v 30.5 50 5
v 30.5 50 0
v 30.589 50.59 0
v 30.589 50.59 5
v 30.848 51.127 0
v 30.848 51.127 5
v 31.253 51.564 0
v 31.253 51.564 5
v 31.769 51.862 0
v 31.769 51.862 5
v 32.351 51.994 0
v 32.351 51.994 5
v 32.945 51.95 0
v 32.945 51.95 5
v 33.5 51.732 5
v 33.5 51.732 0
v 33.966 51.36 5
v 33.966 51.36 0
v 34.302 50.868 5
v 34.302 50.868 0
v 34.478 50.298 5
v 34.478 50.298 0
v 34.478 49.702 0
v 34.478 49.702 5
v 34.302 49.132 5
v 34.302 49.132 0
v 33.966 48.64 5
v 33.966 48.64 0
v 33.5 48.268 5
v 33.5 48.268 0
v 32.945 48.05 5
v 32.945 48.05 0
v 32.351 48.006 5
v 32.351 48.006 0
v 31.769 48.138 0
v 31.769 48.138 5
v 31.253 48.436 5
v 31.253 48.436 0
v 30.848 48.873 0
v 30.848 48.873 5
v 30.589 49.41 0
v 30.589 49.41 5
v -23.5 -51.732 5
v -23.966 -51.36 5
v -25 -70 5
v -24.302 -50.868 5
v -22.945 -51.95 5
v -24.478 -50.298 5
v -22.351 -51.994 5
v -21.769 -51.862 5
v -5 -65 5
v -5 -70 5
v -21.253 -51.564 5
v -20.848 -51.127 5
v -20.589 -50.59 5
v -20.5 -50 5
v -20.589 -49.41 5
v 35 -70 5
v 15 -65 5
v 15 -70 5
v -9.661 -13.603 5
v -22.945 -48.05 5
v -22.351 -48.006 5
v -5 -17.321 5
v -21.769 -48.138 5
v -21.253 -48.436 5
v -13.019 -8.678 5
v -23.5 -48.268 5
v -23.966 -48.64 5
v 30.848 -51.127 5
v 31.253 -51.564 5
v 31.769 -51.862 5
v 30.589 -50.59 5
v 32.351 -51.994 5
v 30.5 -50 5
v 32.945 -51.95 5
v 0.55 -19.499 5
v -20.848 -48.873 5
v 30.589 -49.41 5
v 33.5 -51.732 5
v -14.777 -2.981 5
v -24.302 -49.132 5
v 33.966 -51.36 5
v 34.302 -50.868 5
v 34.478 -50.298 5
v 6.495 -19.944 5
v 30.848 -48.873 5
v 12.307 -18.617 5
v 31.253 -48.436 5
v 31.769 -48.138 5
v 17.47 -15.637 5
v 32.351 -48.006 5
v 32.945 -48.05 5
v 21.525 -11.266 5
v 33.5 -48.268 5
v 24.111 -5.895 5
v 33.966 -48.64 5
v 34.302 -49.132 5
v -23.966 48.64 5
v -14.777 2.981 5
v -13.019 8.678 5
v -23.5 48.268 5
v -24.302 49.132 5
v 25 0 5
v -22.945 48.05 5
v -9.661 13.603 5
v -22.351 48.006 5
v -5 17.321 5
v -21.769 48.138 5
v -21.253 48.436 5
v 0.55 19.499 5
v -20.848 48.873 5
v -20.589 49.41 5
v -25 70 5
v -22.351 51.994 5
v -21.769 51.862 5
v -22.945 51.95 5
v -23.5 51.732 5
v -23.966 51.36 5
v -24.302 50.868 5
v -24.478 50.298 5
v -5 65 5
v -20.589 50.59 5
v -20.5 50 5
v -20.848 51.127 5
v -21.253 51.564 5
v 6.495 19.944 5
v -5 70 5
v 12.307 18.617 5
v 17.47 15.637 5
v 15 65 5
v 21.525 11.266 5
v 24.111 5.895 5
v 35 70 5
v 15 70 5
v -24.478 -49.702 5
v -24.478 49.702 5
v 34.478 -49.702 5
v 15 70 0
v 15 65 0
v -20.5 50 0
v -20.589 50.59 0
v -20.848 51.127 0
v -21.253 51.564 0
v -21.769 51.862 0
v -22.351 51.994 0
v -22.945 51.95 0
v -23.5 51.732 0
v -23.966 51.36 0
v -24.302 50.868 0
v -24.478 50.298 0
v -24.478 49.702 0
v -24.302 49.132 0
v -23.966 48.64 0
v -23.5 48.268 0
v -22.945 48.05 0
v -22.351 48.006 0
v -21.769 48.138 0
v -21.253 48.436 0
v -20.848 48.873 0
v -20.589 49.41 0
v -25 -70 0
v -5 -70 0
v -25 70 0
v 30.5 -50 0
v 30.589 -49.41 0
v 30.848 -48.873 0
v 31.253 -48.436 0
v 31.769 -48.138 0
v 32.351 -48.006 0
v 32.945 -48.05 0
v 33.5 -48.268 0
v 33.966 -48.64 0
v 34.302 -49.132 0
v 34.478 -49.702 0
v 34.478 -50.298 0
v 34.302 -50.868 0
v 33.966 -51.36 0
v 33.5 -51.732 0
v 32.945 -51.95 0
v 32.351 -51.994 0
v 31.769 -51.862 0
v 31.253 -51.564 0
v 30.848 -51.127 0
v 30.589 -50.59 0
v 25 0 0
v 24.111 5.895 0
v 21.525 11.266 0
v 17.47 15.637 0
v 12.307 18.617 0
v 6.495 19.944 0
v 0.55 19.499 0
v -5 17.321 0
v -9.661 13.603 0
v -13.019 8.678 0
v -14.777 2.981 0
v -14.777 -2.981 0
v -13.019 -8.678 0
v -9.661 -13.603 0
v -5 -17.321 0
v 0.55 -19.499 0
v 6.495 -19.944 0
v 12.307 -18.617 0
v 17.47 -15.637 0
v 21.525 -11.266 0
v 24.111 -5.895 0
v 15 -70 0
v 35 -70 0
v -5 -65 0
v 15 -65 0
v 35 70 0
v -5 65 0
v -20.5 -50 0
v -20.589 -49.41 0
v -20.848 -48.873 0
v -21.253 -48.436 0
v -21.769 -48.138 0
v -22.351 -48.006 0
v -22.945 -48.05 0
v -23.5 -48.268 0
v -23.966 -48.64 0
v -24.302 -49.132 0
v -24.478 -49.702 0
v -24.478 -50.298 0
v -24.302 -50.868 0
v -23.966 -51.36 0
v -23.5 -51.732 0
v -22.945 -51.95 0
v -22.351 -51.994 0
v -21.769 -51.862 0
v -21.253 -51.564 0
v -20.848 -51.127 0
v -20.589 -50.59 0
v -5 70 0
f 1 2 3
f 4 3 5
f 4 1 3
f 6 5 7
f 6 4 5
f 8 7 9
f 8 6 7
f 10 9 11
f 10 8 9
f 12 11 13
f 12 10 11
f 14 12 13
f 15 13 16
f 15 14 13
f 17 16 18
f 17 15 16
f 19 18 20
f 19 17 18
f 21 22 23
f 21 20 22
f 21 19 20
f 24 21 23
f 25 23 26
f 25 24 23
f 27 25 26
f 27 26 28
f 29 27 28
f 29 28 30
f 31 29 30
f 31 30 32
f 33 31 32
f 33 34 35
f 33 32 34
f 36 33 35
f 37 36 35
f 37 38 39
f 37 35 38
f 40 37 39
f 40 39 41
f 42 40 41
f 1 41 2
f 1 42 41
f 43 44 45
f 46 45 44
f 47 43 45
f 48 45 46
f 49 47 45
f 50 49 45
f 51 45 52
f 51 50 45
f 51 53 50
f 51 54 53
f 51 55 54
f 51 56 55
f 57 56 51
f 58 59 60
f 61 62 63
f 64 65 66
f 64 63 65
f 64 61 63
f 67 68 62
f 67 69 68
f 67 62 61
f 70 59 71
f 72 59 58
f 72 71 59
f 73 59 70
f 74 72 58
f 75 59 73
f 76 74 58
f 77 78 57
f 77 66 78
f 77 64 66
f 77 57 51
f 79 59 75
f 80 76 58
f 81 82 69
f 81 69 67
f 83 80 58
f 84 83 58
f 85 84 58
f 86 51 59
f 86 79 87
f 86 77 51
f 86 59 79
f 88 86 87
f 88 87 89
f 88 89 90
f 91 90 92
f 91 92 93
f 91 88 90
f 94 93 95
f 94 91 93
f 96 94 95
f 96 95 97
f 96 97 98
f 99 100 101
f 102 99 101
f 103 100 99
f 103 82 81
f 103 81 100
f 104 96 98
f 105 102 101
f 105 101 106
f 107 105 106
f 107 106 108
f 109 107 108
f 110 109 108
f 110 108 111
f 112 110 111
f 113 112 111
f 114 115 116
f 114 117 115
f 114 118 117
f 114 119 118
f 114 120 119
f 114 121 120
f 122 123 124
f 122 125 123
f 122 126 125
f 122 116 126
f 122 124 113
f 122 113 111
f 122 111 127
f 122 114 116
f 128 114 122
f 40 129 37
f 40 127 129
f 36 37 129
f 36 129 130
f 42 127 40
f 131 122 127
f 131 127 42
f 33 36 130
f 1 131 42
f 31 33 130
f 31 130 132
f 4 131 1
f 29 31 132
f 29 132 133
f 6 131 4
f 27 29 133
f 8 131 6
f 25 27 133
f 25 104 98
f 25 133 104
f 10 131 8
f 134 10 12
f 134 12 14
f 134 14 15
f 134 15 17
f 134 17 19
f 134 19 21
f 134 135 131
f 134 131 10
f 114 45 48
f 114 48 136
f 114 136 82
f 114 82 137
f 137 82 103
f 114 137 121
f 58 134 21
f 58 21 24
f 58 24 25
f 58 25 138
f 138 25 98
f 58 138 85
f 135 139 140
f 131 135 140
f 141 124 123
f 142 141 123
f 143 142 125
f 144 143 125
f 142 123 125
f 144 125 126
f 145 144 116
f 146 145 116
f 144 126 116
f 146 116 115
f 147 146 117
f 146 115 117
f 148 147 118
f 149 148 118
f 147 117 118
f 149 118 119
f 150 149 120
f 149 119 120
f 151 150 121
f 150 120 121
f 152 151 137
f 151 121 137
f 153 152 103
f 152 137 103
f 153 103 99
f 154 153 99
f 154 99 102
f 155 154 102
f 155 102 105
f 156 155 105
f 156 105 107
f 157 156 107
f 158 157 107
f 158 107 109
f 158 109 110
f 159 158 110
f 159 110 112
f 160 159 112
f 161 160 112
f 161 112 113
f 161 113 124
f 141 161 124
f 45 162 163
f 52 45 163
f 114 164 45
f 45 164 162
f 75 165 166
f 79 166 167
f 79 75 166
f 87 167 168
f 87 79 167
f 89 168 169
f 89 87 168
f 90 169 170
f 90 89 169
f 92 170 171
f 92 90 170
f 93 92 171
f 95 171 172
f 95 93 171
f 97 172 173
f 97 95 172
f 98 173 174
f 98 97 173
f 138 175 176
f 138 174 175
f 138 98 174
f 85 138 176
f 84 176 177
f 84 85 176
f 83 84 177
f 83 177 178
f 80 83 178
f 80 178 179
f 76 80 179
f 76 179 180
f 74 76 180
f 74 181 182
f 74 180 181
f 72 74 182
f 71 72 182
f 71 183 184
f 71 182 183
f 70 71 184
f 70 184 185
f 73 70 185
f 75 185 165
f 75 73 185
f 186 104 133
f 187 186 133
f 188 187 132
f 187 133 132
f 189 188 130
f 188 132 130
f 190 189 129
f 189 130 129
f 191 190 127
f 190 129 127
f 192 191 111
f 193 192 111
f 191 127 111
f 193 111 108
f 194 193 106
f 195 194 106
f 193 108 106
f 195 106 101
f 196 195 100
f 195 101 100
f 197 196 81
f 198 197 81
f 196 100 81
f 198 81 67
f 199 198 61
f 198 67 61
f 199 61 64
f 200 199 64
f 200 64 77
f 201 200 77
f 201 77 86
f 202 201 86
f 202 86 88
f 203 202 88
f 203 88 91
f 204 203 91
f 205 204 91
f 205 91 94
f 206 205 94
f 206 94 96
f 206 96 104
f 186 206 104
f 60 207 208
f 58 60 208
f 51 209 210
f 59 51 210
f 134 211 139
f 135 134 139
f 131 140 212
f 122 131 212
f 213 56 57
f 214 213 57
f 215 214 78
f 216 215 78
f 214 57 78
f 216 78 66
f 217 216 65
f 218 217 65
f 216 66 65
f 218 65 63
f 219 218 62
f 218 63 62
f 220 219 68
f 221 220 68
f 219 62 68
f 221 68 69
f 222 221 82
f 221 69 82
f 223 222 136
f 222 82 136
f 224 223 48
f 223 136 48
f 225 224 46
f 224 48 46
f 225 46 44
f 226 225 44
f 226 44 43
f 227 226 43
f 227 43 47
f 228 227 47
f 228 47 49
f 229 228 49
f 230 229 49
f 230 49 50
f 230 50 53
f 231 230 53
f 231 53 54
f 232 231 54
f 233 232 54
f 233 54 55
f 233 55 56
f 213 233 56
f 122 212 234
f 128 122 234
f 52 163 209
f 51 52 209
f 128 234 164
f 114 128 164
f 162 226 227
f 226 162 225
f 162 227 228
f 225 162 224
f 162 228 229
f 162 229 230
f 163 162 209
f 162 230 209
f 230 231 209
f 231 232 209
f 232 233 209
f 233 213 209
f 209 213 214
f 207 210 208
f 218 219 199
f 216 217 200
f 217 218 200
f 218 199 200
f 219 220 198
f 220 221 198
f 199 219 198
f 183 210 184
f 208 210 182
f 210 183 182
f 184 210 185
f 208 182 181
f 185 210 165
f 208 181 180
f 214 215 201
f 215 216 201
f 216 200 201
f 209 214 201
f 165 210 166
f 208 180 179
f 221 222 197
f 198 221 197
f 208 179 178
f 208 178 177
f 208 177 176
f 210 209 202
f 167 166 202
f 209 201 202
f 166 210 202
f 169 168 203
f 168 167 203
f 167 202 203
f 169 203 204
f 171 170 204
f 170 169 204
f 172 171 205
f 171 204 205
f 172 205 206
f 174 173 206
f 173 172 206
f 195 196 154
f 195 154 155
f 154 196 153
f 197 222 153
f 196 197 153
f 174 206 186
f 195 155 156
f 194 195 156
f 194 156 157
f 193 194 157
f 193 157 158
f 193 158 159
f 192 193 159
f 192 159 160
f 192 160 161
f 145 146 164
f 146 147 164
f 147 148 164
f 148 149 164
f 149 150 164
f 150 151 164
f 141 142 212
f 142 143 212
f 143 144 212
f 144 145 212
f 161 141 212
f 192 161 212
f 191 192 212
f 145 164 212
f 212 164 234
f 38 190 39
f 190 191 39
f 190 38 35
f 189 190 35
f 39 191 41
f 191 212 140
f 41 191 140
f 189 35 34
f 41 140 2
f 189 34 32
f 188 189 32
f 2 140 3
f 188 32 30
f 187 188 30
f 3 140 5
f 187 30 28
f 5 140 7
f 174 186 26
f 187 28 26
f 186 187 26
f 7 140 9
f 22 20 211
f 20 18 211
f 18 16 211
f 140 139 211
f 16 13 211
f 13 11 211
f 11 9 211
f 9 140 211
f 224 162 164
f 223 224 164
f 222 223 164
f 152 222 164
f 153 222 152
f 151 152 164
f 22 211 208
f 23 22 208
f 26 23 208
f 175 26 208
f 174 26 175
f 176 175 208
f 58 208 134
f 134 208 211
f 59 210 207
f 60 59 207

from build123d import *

# Parameters (mm, degrees)
BOSS_EXTRUDE1_DEPTH = 5
SKETCH3_R           = 2
CUT_EXTRUDE1_DEPTH  = 10
SKETCH4_R           = 20
CUT_EXTRUDE2_DEPTH  = 300


with BuildPart() as part:
    # Sketch2 → Boss-Extrude1 (new body)
    with BuildSketch(Plane.XY):
        Polygon((-5, 70), (-25, 70), (-25, -70), (-5, -70), (-5, -65), (15, -65), (15, -70), (35, -70), (35, 70), (15, 70), (15, 65), (-5, 65), align=None)
    extrude(amount=BOSS_EXTRUDE1_DEPTH)

    # Sketch3 → Cut-Extrude1 (cut)
    with BuildSketch(Plane.XY.offset(5)):
        with Locations((-22.5, 50)):
            Circle(SKETCH3_R)
        with Locations((-22.5, -50)):
            Circle(SKETCH3_R)
    cut_extrude1 = extrude(amount=-CUT_EXTRUDE1_DEPTH, mode=Mode.SUBTRACT)

    # Mirror1: Cut-Extrude1 across plane
    add(cut_extrude1.mirror(Plane.ZY.offset(-5)), mode=Mode.SUBTRACT)

    # Sketch4 → Cut-Extrude2 (cut)
    with BuildSketch(Plane.XY.offset(5)):
        with Locations((5, 0)):
            Circle(SKETCH4_R)
    extrude(amount=-CUT_EXTRUDE2_DEPTH, mode=Mode.SUBTRACT)


solid = part.part
